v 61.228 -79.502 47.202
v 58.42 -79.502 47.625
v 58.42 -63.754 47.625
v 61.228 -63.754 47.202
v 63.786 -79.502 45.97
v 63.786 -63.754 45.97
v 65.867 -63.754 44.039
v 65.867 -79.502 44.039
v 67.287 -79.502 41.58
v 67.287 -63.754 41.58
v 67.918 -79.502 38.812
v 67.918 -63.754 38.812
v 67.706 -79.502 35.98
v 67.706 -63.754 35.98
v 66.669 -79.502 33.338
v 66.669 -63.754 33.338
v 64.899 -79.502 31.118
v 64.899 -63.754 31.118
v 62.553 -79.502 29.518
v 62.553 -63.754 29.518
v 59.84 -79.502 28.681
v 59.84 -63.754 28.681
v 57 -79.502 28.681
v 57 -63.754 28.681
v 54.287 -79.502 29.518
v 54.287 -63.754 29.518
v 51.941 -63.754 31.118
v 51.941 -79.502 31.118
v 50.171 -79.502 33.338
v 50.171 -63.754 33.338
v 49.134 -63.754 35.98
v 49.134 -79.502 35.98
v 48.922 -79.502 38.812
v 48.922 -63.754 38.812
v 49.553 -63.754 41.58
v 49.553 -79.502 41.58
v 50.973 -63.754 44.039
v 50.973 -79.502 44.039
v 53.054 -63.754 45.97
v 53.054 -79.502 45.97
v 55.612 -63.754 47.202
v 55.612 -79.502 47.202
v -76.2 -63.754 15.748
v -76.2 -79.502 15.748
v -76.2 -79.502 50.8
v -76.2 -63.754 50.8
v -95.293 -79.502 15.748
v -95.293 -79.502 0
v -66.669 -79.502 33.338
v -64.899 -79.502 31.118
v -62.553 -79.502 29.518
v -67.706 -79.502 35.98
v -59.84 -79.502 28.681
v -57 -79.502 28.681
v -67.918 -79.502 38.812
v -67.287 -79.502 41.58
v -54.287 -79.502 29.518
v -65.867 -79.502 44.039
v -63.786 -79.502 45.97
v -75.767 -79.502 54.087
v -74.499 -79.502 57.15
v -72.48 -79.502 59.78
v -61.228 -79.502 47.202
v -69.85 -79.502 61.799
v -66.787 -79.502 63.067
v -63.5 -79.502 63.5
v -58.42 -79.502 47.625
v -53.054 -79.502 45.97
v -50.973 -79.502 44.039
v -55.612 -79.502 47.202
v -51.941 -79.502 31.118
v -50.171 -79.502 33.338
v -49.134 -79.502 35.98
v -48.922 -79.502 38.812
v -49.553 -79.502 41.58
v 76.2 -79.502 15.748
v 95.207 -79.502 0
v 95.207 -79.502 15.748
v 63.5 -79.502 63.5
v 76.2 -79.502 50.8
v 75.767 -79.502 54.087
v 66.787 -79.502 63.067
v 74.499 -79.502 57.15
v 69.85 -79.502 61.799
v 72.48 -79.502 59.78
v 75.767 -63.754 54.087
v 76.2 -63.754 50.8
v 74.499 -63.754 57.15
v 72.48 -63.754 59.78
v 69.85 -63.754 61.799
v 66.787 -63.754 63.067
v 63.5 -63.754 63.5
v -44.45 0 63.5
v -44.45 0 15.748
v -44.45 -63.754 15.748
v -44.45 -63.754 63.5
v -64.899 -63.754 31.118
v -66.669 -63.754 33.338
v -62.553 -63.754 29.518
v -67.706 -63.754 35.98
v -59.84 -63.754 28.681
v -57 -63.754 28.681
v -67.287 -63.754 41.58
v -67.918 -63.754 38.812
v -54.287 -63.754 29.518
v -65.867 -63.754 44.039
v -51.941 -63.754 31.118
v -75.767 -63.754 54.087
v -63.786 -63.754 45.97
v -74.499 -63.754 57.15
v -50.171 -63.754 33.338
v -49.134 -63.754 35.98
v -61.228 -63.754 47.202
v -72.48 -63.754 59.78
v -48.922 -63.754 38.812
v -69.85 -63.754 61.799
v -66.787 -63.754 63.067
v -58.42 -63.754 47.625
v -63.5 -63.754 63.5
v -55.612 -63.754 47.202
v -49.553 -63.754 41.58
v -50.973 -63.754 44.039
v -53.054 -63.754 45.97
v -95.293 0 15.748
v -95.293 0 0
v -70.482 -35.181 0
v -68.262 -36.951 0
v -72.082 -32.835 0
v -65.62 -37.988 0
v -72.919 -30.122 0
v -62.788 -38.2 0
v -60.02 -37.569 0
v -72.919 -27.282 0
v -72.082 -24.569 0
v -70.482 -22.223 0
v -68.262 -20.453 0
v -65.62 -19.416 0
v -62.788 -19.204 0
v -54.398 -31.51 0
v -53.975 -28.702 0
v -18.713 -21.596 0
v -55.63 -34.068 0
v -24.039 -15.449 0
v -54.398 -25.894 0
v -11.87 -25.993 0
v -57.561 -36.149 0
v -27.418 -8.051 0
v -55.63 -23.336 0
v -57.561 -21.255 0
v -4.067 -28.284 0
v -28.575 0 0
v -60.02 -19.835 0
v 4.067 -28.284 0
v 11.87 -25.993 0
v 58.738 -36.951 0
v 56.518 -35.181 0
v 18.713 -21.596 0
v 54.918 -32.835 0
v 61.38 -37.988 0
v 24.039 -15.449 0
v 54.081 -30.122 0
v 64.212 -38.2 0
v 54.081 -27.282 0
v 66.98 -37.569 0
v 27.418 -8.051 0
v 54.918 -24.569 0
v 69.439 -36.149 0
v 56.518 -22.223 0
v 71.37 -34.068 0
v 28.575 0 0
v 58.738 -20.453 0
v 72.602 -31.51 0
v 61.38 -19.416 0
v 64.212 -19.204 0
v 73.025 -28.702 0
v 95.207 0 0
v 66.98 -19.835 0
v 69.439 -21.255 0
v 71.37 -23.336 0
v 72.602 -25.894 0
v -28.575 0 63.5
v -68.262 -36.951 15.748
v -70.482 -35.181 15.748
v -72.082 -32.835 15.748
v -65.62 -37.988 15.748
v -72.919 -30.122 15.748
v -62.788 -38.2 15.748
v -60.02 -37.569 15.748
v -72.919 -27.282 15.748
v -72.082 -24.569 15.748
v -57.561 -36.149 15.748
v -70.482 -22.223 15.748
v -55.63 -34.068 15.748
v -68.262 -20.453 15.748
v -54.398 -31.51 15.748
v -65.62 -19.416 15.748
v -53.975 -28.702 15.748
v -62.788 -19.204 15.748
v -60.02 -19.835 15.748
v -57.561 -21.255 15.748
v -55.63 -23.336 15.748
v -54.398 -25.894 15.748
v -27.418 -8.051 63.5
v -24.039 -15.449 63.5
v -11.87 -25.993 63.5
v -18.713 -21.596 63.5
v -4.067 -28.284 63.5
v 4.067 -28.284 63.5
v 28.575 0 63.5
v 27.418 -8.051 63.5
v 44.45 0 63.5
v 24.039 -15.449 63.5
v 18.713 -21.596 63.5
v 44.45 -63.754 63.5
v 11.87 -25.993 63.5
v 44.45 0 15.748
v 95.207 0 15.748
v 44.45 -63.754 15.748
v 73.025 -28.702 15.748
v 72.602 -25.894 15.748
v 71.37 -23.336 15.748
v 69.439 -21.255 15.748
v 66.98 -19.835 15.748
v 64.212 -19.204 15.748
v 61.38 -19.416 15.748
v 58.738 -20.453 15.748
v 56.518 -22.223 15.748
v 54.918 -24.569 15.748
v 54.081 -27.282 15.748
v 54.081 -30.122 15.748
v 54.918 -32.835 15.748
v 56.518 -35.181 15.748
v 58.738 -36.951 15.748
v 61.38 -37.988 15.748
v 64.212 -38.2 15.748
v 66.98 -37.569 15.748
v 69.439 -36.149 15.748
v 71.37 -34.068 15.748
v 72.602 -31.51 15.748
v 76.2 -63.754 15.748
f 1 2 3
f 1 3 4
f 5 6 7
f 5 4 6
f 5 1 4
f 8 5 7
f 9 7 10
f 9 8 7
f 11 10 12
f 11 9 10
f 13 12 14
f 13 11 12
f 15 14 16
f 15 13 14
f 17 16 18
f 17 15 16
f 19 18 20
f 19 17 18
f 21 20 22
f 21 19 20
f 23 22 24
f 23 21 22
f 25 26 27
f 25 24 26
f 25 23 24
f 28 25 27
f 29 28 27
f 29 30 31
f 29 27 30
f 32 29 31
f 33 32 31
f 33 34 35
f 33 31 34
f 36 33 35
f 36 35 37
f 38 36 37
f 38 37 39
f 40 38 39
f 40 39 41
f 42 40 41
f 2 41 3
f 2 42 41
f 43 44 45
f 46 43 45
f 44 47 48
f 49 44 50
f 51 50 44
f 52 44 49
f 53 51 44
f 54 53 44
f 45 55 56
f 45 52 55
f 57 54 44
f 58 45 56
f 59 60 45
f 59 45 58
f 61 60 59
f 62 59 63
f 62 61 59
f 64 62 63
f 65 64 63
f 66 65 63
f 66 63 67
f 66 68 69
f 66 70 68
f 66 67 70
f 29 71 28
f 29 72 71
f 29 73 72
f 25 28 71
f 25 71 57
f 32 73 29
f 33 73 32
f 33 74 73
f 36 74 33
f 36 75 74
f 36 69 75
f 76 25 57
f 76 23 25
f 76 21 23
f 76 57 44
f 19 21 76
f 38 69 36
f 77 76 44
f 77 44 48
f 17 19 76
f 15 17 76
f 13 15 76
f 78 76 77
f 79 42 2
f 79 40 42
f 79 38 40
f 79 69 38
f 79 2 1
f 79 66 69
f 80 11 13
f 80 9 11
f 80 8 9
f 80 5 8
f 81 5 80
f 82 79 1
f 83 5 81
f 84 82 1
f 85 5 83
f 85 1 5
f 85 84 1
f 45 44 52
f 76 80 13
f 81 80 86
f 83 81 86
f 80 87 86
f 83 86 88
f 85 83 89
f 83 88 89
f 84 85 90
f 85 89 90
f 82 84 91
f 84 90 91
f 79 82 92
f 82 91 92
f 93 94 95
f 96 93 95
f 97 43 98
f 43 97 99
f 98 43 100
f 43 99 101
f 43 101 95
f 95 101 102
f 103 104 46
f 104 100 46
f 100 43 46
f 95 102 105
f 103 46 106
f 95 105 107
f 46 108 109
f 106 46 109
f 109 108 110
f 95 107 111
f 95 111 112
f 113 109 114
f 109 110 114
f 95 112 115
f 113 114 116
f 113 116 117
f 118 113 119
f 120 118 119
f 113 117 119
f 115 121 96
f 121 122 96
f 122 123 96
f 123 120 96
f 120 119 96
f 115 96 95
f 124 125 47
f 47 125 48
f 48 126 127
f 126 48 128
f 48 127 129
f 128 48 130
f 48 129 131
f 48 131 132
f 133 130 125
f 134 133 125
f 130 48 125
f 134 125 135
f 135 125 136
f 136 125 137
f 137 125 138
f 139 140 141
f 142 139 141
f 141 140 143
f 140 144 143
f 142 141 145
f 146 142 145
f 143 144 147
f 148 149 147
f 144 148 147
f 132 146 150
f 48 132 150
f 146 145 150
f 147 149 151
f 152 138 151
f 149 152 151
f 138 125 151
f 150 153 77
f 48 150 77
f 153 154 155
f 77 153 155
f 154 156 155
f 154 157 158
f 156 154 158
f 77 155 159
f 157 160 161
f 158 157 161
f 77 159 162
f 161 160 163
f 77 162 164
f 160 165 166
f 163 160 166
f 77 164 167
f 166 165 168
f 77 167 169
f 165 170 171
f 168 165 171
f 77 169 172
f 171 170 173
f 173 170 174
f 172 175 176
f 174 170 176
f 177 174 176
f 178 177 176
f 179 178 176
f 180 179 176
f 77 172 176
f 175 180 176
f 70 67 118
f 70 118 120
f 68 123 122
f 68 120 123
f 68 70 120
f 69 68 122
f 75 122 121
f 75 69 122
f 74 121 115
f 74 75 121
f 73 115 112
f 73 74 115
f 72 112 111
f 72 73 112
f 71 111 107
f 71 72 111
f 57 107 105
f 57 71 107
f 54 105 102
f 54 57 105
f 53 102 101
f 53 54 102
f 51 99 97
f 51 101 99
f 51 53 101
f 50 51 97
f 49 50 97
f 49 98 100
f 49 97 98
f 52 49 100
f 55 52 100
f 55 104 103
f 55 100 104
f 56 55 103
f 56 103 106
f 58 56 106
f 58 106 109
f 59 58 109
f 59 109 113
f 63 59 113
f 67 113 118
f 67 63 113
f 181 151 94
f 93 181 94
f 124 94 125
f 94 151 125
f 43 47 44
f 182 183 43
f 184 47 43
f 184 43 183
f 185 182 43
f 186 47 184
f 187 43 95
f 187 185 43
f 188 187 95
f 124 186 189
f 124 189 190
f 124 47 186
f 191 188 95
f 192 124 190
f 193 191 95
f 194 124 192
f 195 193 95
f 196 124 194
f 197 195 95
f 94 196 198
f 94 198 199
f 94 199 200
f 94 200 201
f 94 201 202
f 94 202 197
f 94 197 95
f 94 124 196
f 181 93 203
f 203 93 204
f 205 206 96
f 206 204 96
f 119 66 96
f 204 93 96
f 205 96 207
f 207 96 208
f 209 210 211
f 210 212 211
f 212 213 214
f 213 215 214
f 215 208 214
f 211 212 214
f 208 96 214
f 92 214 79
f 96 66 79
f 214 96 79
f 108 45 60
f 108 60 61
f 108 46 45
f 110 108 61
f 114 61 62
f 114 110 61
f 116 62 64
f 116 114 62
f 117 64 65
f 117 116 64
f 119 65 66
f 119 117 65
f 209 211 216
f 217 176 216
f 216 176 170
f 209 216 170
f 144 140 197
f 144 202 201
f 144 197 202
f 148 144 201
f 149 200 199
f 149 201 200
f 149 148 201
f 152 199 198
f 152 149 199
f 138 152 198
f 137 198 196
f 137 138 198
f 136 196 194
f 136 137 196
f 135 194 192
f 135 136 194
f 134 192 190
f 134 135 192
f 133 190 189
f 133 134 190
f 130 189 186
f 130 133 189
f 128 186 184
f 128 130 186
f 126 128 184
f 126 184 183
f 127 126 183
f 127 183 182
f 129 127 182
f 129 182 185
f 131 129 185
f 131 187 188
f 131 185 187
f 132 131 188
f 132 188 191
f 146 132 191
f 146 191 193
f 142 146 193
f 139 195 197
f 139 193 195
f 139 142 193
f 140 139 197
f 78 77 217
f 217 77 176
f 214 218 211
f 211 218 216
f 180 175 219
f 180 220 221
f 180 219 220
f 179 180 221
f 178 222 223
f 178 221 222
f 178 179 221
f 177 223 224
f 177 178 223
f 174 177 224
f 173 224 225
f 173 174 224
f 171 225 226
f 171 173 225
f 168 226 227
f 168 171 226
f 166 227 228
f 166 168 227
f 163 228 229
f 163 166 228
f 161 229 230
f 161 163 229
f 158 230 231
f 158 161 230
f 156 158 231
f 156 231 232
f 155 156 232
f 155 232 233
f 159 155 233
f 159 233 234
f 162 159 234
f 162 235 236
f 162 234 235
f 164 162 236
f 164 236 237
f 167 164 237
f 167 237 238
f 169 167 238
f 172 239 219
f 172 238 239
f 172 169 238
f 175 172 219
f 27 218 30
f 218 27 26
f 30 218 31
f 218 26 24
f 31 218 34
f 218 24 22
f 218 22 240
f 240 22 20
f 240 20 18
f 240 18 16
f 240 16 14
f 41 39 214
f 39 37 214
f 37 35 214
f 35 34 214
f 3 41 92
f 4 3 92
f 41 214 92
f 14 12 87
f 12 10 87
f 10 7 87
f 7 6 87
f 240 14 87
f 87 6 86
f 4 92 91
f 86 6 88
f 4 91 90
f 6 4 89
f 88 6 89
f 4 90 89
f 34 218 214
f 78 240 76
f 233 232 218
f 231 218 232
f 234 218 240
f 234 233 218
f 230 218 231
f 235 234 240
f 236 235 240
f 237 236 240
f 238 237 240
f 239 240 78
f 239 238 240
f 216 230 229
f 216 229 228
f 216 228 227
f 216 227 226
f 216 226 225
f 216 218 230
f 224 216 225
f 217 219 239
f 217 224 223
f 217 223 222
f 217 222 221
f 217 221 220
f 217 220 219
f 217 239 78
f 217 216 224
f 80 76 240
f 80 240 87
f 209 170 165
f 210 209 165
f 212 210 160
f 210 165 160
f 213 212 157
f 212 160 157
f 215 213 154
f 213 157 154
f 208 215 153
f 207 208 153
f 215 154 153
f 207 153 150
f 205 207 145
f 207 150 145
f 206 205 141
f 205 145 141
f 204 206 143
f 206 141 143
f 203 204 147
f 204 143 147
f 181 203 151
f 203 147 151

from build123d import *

# Parameters (mm, degrees)
BOSS_EXTRUDE1_DEPTH     = 15.748
BOSS_EXTRUDE3_DEPTH     = 47.752
SKETCH4_W               = 31.75
SKETCH4_H               = 47.752
BOSS_EXTRUDE4_DEPTH     = 15.748
FILLET1_R               = 12.7
CUT_EXTRUDE1_DEPTH      = 133.971969005
CUT_EXTRUDE1_DEPTH_BACK = 133.971969005
SKETCH5_R               = 9.525
CUT_EXTRUDE2_DEPTH      = 132.063135736
CUT_EXTRUDE2_DEPTH_BACK = 132.063135736
SKETCH6_R               = 9.525


with BuildPart() as part:
    # Sketch1 → Boss-Extrude1 (new body)
    with BuildSketch(Plane.XY):
        with BuildLine():
            Line((-28.575, 0), (-95.292827815, 0))
            Line((-95.292827815, 0), (-95.292827815, -79.502))
            Line((-95.292827815, -79.502), (95.207172185, -79.502))
            Line((95.207172185, -79.502), (95.207172185, 0))
            Line((95.207172185, 0), (28.575, 0))
            ThreePointArc((28.575, 0), (0, -28.575), (-28.575, 0))
        make_face()
    extrude(amount=BOSS_EXTRUDE1_DEPTH)

    # Sketch2 → Boss-Extrude3 (add)
    with BuildSketch(Plane.XY.offset(15.748)):
        with BuildLine():
            Line((-44.45, 0), (-44.45, -79.502))
            Line((-44.45, -79.502), (44.45, -79.502))
            Line((44.45, -79.502), (44.45, 0))
            Line((44.45, 0), (28.575, 0))
            ThreePointArc((28.575, 0), (0, -28.575), (-28.575, 0))
            Line((-28.575, 0), (-44.45, 0))
        make_face()
    extrude(amount=BOSS_EXTRUDE3_DEPTH)

    # Sketch4 → Boss-Extrude4 (add)
    with BuildSketch(Plane.XZ.offset(79.502)):
        with Locations((-60.325, 39.624)):
            Rectangle(SKETCH4_W, SKETCH4_H)
        with Locations((60.325, 39.624)):
            Rectangle(SKETCH4_W, SKETCH4_H)
    extrude(amount=-BOSS_EXTRUDE4_DEPTH)

    # Fillet1
    fillet1_edges = [part.edges().sort_by_distance(p)[0] for p in [
        (-76.2, -71.628, 63.5),
        (76.2, -71.628, 63.5),
    ]]
    fillet(fillet1_edges, radius=FILLET1_R)

    # Sketch5 → Cut-Extrude1 (cut, two sides: drawn at the far end of the back side and taken through both)
    with BuildSketch(Plane.XY.offset(15.748).offset(-CUT_EXTRUDE1_DEPTH_BACK)):
        with Locations((63.5, -28.702)):
            Circle(SKETCH5_R)
        with Locations((-63.5, -28.702)):
            Circle(SKETCH5_R)
    extrude(amount=CUT_EXTRUDE1_DEPTH + CUT_EXTRUDE1_DEPTH_BACK, mode=Mode.SUBTRACT)

    # Sketch6 → Cut-Extrude2 (cut, two sides: drawn at the far end of the back side and taken through both)
    with BuildSketch(Plane(origin=(0, -63.754, 0), x_dir=(1, 0, 0), z_dir=(0, 1, 0)).offset(-CUT_EXTRUDE2_DEPTH_BACK)):
        with Locations(Location((-58.42, -38.1, 0), (0, 0, 270))):
            Circle(SKETCH6_R)
        with Locations(Location((58.42, -38.1, 0), (0, 0, 270))):
            Circle(SKETCH6_R)
    extrude(amount=CUT_EXTRUDE2_DEPTH + CUT_EXTRUDE2_DEPTH_BACK, mode=Mode.SUBTRACT)


solid = part.part
